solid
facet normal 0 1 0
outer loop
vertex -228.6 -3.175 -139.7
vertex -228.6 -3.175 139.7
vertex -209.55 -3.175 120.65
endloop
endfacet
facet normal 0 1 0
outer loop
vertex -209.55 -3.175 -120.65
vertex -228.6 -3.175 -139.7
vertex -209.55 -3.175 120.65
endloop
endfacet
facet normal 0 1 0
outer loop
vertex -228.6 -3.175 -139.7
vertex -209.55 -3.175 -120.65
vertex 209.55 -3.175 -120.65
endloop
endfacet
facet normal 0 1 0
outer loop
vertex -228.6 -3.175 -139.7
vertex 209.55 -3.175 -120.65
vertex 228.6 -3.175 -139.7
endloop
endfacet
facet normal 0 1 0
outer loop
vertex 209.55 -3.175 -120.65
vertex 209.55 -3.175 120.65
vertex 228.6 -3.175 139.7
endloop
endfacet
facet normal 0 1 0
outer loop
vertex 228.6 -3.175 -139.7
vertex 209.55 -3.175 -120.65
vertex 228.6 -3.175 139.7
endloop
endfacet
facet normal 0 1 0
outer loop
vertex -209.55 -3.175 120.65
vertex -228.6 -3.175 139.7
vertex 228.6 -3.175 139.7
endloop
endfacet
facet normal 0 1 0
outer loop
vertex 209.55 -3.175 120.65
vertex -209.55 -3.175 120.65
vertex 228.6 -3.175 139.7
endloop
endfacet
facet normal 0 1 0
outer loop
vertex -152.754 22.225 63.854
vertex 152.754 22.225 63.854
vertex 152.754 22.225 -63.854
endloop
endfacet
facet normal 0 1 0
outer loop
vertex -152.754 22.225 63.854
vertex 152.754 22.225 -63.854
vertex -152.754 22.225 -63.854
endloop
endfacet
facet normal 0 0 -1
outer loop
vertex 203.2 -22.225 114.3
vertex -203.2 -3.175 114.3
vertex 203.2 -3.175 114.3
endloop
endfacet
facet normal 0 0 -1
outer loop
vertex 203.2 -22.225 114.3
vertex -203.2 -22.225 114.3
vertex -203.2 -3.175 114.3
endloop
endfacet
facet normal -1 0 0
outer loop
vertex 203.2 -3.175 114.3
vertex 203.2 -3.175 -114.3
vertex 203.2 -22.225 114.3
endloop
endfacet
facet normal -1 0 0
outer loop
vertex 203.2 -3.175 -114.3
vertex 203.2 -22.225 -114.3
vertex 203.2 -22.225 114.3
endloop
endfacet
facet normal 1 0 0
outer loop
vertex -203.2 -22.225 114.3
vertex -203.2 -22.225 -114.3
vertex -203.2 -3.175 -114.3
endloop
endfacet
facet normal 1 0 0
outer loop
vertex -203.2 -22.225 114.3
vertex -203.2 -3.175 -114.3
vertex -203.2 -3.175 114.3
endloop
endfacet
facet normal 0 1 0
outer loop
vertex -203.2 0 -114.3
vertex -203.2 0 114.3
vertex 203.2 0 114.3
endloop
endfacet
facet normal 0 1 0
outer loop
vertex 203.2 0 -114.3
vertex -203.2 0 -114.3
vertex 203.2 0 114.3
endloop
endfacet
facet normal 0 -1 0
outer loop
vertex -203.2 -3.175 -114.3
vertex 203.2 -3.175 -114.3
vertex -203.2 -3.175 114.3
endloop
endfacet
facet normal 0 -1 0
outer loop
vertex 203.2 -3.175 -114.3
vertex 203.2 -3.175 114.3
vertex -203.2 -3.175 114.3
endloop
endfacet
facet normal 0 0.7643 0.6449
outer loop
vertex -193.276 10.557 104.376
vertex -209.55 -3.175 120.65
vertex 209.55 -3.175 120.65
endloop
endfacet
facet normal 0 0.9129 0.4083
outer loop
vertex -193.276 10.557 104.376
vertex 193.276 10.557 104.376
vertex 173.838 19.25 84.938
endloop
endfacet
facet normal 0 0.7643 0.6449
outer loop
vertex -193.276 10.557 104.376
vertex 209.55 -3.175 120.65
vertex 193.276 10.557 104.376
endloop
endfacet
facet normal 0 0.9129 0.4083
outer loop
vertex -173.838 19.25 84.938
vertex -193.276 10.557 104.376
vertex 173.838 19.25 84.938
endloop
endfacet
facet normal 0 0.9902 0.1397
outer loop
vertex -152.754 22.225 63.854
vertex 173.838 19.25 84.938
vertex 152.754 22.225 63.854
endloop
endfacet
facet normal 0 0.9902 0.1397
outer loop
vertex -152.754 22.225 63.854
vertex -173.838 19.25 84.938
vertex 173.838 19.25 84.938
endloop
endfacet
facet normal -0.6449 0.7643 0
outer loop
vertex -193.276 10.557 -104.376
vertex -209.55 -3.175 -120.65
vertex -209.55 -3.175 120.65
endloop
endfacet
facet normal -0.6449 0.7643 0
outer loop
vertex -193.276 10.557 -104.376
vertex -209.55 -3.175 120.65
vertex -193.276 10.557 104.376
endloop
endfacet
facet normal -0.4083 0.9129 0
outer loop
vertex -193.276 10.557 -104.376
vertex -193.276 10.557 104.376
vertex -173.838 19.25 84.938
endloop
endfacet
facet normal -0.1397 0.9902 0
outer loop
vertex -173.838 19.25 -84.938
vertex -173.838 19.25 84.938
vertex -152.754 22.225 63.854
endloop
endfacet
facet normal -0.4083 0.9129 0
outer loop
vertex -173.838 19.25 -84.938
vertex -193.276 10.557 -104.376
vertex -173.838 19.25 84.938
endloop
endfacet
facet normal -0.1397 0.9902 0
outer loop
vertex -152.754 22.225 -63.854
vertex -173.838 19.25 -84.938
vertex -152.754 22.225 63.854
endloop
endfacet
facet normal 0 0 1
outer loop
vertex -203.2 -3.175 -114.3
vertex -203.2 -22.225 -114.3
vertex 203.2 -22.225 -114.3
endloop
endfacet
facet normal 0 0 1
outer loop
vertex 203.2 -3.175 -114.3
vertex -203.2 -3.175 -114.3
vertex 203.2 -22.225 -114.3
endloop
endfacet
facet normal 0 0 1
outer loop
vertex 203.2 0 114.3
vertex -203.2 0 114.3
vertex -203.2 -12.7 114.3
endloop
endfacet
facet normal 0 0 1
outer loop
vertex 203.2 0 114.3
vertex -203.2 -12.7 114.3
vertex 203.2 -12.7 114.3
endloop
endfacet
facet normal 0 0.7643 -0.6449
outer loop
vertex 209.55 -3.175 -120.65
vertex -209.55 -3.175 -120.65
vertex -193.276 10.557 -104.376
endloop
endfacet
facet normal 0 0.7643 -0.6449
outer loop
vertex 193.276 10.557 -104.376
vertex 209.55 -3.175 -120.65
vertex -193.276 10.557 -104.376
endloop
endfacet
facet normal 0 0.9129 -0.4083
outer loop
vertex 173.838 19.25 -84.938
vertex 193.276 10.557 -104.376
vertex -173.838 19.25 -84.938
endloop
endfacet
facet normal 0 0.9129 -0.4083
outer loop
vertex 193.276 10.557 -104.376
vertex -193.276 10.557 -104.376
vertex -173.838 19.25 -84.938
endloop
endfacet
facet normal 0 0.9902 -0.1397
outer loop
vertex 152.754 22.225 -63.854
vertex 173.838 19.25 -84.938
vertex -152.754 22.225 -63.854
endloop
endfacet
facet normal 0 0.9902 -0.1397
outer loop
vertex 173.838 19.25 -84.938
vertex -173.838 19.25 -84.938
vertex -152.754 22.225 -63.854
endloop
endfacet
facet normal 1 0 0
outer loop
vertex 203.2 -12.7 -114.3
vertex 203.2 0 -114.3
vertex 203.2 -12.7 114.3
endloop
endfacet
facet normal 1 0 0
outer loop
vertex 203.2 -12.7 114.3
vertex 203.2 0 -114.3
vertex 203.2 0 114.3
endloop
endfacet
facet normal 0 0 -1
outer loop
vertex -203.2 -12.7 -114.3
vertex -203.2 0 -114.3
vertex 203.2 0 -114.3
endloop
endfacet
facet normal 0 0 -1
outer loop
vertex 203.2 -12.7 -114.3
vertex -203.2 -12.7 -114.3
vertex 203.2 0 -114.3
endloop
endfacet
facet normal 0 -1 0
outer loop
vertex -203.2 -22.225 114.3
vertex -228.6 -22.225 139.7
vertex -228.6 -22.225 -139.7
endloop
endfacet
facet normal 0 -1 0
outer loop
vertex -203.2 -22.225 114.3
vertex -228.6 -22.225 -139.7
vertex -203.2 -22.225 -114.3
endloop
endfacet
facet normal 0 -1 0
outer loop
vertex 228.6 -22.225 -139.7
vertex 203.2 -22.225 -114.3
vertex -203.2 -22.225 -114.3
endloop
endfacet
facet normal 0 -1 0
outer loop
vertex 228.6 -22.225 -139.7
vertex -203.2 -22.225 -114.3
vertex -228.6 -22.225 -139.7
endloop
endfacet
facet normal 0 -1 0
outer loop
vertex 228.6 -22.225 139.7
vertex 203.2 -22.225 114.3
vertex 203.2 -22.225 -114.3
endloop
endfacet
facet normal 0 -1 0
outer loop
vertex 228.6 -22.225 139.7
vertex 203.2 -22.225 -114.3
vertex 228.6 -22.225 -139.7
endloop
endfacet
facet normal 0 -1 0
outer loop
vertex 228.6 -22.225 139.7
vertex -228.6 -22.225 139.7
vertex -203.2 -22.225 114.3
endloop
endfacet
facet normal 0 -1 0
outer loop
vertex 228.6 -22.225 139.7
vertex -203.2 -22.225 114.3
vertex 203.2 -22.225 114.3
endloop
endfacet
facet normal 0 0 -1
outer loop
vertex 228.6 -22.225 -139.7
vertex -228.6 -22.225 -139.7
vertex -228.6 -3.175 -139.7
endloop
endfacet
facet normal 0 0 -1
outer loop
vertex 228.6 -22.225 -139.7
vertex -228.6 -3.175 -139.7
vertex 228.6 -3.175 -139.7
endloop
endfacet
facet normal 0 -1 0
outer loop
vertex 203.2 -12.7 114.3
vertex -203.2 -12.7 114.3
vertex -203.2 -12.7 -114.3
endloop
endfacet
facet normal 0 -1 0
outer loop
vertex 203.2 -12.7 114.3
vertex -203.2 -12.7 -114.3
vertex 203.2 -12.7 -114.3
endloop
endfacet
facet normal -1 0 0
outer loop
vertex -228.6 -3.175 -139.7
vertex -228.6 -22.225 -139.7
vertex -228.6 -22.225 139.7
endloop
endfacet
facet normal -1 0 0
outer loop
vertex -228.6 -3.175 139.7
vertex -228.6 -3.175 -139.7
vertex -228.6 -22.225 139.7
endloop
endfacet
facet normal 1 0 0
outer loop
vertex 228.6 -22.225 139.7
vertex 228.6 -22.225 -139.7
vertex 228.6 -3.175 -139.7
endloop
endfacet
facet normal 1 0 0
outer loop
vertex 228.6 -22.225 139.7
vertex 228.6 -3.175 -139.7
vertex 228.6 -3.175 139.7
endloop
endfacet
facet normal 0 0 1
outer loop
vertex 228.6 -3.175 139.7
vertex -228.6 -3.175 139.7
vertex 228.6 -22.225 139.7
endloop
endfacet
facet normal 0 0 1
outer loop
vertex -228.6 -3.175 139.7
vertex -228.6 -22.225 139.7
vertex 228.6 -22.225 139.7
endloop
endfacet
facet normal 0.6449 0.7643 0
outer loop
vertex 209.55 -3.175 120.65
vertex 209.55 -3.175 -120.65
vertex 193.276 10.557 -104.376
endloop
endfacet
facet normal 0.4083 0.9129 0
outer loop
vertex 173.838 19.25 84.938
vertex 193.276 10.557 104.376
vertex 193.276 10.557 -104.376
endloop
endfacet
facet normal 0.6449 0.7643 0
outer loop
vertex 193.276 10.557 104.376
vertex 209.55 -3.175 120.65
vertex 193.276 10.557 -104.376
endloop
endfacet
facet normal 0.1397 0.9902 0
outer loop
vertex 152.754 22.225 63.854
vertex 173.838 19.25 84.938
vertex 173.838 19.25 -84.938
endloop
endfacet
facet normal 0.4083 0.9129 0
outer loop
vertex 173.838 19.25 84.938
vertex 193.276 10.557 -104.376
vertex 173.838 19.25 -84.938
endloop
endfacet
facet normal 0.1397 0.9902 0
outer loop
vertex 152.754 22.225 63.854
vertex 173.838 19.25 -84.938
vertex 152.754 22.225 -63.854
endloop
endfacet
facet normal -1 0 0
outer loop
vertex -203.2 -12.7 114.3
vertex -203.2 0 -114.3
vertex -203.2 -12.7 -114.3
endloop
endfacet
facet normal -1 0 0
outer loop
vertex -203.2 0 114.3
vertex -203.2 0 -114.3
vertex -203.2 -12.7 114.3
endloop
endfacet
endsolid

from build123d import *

# Parameters (mm, degrees)
F0_W        = 406.4
F0_H        = 228.6
F1_DEPTH    = 12.7
F2_W        = 457.2
F2_H        = 279.4
F2_W_2      = 406.4
F2_H_2      = 228.6
F3_DEPTH    = 9.525
F4_W        = 419.1
F4_H        = 241.3
F5_DEPTH    = 25.4
F6_T1_DEPTH = 525.2806331425
F6_T3_DEPTH = 703.0806331425


# Not quite as in the source:
# - a fillet or chamfer that OpenCascade refuses, or shapes differently, is made with other operations: its cross-section is extruded or revolved along the edge and cut away or added


with BuildPart() as f1:
    # F0 (on Front) → F1 (new body)
    with BuildSketch(Plane.XZ):
        Rectangle(F0_W, F0_H)
    extrude(amount=F1_DEPTH)


with BuildPart() as f3:
    # F2 (on face) → F3 (new body, symmetric)
    with BuildSketch(Plane.XZ.offset(12.7)):
        Rectangle(F2_W, F2_H)
        Rectangle(F2_W_2, F2_H_2, mode=Mode.SUBTRACT)
    extrude(amount=F3_DEPTH, both=True)

    # F4 (on face) → F5 (join)
    with BuildSketch(Plane(origin=(0, -3.175, 0), x_dir=(-1, 0, 0), z_dir=(0, 1, 0))):
        Rectangle(F4_W, F4_H)
    extrude(amount=F5_DEPTH)

    # F6: fillet of radius 76.2 on 4 edges, made by hand

    # F6_s2 → F6_t1 (cut)
    with BuildSketch(Plane.XY.offset(-262.6403165712)):
        with BuildLine():
            ThreePointArc((209.55, -3.175), (183.8623931049, 15.5857648032), (152.7538733715, 22.225))
            Line((152.7538733715, 22.225), (209.55, 22.225))
            Line((209.55, 22.225), (209.55, -3.175))
        make_face()
        with BuildLine():
            ThreePointArc((-209.55, -3.175), (-183.8623931049, 15.5857648032), (-152.7538733715, 22.225))
            Line((-152.7538733715, 22.225), (-209.55, 22.225))
            Line((-209.55, 22.225), (-209.55, -3.175))
        make_face()
    extrude(amount=F6_T1_DEPTH, mode=Mode.SUBTRACT)

    # F6_s4 → F6_t3 (cut)
    with BuildSketch(Plane.YZ.offset(-351.5403165712)):
        with BuildLine():
            ThreePointArc((-3.175, 120.65), (15.5857648032, 94.9623931049), (22.225, 63.8538733715))
            Line((22.225, 63.8538733715), (22.225, 120.65))
            Line((22.225, 120.65), (-3.175, 120.65))
        make_face()
        with BuildLine():
            ThreePointArc((-3.175, -120.65), (15.5857648032, -94.9623931049), (22.225, -63.8538733715))
            Line((22.225, -63.8538733715), (22.225, -120.65))
            Line((22.225, -120.65), (-3.175, -120.65))
        make_face()
    extrude(amount=F6_T3_DEPTH, mode=Mode.SUBTRACT)


solid = Compound([f1.part, f3.part])
